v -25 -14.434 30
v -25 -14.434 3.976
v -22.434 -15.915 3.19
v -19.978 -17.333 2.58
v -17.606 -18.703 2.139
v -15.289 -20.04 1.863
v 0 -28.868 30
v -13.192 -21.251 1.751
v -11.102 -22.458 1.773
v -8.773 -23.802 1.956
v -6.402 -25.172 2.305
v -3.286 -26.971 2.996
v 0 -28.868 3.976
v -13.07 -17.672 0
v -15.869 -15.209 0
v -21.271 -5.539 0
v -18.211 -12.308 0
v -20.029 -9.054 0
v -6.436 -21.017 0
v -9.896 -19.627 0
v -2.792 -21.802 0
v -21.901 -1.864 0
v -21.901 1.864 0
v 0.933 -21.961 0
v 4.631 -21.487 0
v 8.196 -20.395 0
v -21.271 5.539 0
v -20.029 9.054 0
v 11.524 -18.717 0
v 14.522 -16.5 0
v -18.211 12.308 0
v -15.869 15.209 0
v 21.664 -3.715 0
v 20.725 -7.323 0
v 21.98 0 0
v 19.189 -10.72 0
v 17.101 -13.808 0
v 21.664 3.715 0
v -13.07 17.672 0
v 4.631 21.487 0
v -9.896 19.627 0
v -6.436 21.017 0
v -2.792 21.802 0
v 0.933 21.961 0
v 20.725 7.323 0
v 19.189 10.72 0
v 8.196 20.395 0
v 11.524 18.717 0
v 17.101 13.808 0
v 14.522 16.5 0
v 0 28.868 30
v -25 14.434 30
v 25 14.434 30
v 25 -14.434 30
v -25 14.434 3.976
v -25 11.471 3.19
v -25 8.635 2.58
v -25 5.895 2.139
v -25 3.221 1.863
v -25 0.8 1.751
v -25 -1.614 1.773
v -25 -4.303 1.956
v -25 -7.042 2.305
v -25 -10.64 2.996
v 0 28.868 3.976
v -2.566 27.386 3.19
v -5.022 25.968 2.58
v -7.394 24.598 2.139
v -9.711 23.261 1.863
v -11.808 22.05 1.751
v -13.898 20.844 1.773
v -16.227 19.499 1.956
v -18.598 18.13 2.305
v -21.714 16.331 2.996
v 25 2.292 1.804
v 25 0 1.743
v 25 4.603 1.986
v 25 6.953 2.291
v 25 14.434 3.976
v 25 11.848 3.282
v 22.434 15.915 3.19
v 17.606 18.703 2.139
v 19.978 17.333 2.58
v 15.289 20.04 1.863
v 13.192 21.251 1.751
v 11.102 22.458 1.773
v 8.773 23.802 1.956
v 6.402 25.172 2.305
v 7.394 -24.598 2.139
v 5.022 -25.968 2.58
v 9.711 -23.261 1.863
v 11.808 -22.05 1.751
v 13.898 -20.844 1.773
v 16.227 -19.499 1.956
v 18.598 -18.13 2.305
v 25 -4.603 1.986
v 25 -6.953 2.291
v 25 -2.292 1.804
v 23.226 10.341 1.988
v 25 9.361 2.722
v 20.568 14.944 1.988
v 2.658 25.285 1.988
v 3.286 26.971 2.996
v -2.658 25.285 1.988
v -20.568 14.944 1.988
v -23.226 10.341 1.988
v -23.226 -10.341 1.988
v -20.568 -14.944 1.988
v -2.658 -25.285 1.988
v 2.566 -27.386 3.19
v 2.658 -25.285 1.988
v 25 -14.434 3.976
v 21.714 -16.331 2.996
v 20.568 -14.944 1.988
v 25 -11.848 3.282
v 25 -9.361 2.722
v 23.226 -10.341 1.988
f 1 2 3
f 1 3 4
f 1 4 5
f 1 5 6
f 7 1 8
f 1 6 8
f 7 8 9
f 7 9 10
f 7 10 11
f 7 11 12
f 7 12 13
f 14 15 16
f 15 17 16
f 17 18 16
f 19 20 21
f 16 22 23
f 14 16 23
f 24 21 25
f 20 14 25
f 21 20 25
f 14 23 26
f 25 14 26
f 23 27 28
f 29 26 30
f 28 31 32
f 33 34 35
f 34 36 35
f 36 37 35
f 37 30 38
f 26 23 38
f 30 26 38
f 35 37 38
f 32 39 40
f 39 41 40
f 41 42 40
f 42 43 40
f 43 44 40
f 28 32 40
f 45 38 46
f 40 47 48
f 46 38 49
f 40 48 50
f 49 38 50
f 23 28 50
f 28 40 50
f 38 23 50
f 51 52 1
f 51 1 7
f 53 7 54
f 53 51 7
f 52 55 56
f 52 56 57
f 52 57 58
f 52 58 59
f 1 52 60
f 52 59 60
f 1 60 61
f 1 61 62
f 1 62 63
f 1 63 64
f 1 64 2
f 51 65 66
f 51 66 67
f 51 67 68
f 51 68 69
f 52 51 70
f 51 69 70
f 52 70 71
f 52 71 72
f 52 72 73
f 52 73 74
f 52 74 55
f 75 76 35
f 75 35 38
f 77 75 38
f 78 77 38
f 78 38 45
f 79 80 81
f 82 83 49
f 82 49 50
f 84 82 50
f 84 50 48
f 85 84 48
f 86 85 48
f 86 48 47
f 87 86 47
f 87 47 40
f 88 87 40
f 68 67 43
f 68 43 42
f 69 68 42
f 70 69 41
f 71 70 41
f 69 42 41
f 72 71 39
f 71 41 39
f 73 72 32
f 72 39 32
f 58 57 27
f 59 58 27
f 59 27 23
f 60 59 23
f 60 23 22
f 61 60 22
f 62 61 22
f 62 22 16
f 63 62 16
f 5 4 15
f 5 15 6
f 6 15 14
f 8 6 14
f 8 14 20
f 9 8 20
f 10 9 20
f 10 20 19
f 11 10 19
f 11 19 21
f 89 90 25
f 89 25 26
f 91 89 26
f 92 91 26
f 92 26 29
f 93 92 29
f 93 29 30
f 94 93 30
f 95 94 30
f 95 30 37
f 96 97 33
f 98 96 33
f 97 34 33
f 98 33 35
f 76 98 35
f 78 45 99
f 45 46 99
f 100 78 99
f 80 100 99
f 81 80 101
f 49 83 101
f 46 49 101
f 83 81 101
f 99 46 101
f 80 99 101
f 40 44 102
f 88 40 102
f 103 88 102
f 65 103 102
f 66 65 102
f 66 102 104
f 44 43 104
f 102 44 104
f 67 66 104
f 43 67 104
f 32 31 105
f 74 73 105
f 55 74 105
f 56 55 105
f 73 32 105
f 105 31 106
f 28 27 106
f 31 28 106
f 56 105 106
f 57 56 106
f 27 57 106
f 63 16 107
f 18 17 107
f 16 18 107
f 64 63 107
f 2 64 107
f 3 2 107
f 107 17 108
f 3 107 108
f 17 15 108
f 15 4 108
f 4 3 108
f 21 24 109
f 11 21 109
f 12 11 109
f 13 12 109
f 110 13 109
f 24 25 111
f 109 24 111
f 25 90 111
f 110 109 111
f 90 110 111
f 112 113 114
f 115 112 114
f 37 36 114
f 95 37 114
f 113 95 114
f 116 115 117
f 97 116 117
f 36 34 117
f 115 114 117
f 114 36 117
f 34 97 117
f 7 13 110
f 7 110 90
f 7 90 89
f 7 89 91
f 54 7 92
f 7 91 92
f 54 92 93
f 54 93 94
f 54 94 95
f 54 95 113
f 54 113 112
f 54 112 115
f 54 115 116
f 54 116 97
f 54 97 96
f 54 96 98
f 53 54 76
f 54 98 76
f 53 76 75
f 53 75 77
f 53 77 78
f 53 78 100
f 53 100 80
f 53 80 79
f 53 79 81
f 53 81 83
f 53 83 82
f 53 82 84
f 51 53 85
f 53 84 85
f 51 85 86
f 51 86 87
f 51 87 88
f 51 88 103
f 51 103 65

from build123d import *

# Parameters (mm, degrees)
EXTRUDE_1_DEPTH = 30


with BuildPart() as part:
    # 草图1 → 凸台-拉伸1 (new body)
    with BuildSketch(Plane.XY):
        Polygon((25, -14.43375673), (25, 14.43375673), (0, 28.867513459), (-25, 14.43375673), (-25, -14.43375673), (0, -28.867513459), align=None)
    extrude(amount=EXTRUDE_1_DEPTH)

    # 草图2 → 切除-旋转1 (revolve, cut)
    with BuildSketch(Plane(origin=(0, 0, 0), x_dir=(0, 0, -1), z_dir=(1, 0, 0)), mode=Mode.PRIVATE) as cut_revolve_1_sk:
        Polygon((-4, 28.908520158), (0.613826619, 20.917138036), (0.613826619, 32.83436024), align=None)
    revolve(cut_revolve_1_sk.sketch.rotate(Axis((0, 0, -10.704078941), (0, 0, 1)), 270), axis=Axis((0, 0, -10.704078941), (0, 0, 1)), mode=Mode.SUBTRACT)


solid = part.part
